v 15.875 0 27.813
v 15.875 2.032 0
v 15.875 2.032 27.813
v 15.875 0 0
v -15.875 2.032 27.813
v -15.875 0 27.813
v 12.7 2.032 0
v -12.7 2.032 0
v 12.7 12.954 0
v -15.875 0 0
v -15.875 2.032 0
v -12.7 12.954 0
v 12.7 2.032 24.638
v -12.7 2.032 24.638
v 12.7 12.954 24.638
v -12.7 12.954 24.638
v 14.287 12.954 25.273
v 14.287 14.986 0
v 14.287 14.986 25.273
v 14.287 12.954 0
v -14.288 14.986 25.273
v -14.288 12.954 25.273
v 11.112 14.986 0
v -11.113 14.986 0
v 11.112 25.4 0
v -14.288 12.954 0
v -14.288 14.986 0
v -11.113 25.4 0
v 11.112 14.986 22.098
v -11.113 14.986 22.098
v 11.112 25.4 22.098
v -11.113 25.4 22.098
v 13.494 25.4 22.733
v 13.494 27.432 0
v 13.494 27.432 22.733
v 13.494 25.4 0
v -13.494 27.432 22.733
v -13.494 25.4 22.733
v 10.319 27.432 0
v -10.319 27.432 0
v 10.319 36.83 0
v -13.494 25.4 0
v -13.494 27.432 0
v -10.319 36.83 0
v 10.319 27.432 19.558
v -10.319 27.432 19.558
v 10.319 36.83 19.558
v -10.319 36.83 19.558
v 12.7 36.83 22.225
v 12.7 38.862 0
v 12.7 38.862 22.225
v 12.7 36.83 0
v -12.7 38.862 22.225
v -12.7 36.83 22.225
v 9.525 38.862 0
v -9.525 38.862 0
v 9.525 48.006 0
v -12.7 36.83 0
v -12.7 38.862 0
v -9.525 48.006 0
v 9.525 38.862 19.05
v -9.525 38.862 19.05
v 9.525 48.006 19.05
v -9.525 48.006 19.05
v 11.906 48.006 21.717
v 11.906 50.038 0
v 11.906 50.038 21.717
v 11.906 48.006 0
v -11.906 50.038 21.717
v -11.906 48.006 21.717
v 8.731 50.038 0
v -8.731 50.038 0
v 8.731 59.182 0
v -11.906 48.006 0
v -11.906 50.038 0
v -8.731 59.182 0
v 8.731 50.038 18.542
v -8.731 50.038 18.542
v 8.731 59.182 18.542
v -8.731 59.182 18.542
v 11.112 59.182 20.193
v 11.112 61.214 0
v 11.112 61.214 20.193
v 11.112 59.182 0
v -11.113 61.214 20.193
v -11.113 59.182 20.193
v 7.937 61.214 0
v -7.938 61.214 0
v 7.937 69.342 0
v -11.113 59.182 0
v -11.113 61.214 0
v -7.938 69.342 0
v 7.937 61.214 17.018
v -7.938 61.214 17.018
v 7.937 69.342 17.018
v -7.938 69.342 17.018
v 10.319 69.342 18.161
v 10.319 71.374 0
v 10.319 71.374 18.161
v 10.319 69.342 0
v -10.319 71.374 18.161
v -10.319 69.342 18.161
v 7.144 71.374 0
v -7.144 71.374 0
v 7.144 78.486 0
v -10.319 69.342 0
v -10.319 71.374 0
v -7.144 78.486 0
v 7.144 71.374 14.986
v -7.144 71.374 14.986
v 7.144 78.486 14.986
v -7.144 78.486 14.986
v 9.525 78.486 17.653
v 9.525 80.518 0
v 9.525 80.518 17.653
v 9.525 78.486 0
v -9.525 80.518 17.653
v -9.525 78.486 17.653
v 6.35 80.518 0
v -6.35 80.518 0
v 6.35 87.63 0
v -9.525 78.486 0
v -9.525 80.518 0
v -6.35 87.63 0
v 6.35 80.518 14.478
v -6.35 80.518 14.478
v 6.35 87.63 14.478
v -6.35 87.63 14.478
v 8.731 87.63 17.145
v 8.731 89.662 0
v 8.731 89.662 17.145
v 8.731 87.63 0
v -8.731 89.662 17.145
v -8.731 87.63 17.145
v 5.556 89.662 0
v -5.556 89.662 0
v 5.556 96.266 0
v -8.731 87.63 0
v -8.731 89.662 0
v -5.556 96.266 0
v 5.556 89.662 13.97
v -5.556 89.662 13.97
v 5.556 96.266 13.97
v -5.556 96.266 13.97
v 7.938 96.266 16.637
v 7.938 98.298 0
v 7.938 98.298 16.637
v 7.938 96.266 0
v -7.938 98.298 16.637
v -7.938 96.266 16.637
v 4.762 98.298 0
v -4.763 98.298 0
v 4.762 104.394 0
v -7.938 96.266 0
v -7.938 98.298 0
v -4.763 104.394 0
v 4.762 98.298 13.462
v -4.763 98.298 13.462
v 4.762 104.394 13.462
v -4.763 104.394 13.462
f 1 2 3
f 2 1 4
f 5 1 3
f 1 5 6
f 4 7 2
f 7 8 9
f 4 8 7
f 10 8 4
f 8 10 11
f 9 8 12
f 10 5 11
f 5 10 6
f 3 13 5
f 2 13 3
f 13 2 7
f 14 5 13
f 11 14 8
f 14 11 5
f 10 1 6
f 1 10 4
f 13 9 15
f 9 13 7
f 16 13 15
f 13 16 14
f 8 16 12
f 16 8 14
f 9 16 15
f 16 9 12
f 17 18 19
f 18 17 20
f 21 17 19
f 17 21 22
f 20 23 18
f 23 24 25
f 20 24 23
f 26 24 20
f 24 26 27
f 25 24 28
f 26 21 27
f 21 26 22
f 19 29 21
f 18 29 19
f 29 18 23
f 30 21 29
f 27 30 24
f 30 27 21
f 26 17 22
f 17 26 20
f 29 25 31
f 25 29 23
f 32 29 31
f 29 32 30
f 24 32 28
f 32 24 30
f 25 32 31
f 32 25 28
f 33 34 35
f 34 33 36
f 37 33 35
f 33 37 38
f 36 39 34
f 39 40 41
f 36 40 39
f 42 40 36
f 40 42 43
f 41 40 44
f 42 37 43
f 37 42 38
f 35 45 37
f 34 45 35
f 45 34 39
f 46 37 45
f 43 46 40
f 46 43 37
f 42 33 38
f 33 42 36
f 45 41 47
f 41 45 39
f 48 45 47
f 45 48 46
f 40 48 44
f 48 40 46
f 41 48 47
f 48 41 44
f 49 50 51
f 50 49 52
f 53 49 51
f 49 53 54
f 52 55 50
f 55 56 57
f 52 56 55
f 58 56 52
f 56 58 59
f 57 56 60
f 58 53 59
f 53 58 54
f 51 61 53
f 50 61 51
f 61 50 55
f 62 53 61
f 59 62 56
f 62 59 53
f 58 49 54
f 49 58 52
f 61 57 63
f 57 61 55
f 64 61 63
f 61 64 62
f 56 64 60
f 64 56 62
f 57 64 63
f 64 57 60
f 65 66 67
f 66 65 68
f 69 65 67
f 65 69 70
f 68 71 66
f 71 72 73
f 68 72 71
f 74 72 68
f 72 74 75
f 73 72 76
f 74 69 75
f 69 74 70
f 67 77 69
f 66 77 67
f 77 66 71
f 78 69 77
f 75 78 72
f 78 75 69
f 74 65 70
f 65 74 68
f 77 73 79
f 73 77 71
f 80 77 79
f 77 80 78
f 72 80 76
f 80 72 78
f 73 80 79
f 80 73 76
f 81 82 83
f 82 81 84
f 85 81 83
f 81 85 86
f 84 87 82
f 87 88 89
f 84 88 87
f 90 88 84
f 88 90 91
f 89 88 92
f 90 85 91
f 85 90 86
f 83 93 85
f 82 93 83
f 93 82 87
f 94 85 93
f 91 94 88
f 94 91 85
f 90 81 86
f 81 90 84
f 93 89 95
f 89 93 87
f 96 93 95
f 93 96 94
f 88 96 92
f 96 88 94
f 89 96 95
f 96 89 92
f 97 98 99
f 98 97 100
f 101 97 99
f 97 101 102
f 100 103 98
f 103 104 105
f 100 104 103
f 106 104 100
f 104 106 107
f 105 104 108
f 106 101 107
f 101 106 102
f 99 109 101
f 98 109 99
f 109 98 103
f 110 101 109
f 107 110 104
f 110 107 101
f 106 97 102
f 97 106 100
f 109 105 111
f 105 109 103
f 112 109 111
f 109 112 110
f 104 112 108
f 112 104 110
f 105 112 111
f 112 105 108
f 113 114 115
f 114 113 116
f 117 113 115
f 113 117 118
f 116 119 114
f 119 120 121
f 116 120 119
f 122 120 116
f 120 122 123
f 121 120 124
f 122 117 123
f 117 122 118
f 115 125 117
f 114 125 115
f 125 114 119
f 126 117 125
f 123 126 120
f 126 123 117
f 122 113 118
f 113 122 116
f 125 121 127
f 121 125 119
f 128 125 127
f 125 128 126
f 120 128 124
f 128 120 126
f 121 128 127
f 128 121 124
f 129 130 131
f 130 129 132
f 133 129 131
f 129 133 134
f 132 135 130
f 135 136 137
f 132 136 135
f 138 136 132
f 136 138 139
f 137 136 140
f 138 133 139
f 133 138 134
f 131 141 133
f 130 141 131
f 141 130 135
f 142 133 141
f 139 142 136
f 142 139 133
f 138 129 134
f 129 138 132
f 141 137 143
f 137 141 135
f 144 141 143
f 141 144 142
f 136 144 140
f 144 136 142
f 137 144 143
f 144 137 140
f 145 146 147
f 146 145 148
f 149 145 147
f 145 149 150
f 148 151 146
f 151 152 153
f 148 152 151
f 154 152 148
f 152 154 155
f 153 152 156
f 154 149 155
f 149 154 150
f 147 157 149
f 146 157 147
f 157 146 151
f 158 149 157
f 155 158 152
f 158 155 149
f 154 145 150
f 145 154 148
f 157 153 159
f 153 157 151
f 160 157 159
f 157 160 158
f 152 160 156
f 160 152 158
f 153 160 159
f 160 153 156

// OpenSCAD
function in2mm (v) = v * 25.4;
function vin2mm (v) = [in2mm (v [0]), in2mm (v [1]), in2mm (v [2])];
function infrac (a, b, c) = a + (b * (1 / c));
function sum (v, l = -1, o = 0, i = 0, r = 0) = i < l ? sum (v, l, o, i + 1, r + v [i][o]) : r;

wall   = 0.08;
cube_x = 0;
cube_y = 1;
cube_h = 2;

v = [
  [infrac (1,  0, 16), 0.43, 0.82], // 1"
  [infrac (0,  7,  8), 0.41, 0.72], // 7/8"
  [infrac (0, 13, 16), 0.37, 0.62], // 13/16"
  [infrac (0,  3,  4), 0.36, 0.60], // 3/4"
  [infrac (0, 11, 16), 0.36, 0.58], // 11/16"
  [infrac (0,  5,  8), 0.32, 0.52], // 5/8"
  [infrac (0,  9, 16), 0.28, 0.44], // 9/16"
  [infrac (0,  1,  2), 0.28, 0.42], // 1/2"
  [infrac (0,  7, 16), 0.26, 0.40], // 7/16"
  [infrac (0,  3,  8), 0.24, 0.38], // 3/8"
];

for (i = [0 : len (v) - 1]) {
  translate (vin2mm ([-((v [i][cube_x] + 0.250) / 2), sum (v, i, cube_y) + (wall * i), 0])) {
    cube (vin2mm ([v [i][cube_x] + 0.250, wall, 0.15 + v [i][cube_h] + 0.125]));
    translate (vin2mm ([0.125, wall, 0]))
      cube (vin2mm ([v [i][cube_x], v [i][cube_y], 0.15 + v [i][cube_h]]));
  }
}
